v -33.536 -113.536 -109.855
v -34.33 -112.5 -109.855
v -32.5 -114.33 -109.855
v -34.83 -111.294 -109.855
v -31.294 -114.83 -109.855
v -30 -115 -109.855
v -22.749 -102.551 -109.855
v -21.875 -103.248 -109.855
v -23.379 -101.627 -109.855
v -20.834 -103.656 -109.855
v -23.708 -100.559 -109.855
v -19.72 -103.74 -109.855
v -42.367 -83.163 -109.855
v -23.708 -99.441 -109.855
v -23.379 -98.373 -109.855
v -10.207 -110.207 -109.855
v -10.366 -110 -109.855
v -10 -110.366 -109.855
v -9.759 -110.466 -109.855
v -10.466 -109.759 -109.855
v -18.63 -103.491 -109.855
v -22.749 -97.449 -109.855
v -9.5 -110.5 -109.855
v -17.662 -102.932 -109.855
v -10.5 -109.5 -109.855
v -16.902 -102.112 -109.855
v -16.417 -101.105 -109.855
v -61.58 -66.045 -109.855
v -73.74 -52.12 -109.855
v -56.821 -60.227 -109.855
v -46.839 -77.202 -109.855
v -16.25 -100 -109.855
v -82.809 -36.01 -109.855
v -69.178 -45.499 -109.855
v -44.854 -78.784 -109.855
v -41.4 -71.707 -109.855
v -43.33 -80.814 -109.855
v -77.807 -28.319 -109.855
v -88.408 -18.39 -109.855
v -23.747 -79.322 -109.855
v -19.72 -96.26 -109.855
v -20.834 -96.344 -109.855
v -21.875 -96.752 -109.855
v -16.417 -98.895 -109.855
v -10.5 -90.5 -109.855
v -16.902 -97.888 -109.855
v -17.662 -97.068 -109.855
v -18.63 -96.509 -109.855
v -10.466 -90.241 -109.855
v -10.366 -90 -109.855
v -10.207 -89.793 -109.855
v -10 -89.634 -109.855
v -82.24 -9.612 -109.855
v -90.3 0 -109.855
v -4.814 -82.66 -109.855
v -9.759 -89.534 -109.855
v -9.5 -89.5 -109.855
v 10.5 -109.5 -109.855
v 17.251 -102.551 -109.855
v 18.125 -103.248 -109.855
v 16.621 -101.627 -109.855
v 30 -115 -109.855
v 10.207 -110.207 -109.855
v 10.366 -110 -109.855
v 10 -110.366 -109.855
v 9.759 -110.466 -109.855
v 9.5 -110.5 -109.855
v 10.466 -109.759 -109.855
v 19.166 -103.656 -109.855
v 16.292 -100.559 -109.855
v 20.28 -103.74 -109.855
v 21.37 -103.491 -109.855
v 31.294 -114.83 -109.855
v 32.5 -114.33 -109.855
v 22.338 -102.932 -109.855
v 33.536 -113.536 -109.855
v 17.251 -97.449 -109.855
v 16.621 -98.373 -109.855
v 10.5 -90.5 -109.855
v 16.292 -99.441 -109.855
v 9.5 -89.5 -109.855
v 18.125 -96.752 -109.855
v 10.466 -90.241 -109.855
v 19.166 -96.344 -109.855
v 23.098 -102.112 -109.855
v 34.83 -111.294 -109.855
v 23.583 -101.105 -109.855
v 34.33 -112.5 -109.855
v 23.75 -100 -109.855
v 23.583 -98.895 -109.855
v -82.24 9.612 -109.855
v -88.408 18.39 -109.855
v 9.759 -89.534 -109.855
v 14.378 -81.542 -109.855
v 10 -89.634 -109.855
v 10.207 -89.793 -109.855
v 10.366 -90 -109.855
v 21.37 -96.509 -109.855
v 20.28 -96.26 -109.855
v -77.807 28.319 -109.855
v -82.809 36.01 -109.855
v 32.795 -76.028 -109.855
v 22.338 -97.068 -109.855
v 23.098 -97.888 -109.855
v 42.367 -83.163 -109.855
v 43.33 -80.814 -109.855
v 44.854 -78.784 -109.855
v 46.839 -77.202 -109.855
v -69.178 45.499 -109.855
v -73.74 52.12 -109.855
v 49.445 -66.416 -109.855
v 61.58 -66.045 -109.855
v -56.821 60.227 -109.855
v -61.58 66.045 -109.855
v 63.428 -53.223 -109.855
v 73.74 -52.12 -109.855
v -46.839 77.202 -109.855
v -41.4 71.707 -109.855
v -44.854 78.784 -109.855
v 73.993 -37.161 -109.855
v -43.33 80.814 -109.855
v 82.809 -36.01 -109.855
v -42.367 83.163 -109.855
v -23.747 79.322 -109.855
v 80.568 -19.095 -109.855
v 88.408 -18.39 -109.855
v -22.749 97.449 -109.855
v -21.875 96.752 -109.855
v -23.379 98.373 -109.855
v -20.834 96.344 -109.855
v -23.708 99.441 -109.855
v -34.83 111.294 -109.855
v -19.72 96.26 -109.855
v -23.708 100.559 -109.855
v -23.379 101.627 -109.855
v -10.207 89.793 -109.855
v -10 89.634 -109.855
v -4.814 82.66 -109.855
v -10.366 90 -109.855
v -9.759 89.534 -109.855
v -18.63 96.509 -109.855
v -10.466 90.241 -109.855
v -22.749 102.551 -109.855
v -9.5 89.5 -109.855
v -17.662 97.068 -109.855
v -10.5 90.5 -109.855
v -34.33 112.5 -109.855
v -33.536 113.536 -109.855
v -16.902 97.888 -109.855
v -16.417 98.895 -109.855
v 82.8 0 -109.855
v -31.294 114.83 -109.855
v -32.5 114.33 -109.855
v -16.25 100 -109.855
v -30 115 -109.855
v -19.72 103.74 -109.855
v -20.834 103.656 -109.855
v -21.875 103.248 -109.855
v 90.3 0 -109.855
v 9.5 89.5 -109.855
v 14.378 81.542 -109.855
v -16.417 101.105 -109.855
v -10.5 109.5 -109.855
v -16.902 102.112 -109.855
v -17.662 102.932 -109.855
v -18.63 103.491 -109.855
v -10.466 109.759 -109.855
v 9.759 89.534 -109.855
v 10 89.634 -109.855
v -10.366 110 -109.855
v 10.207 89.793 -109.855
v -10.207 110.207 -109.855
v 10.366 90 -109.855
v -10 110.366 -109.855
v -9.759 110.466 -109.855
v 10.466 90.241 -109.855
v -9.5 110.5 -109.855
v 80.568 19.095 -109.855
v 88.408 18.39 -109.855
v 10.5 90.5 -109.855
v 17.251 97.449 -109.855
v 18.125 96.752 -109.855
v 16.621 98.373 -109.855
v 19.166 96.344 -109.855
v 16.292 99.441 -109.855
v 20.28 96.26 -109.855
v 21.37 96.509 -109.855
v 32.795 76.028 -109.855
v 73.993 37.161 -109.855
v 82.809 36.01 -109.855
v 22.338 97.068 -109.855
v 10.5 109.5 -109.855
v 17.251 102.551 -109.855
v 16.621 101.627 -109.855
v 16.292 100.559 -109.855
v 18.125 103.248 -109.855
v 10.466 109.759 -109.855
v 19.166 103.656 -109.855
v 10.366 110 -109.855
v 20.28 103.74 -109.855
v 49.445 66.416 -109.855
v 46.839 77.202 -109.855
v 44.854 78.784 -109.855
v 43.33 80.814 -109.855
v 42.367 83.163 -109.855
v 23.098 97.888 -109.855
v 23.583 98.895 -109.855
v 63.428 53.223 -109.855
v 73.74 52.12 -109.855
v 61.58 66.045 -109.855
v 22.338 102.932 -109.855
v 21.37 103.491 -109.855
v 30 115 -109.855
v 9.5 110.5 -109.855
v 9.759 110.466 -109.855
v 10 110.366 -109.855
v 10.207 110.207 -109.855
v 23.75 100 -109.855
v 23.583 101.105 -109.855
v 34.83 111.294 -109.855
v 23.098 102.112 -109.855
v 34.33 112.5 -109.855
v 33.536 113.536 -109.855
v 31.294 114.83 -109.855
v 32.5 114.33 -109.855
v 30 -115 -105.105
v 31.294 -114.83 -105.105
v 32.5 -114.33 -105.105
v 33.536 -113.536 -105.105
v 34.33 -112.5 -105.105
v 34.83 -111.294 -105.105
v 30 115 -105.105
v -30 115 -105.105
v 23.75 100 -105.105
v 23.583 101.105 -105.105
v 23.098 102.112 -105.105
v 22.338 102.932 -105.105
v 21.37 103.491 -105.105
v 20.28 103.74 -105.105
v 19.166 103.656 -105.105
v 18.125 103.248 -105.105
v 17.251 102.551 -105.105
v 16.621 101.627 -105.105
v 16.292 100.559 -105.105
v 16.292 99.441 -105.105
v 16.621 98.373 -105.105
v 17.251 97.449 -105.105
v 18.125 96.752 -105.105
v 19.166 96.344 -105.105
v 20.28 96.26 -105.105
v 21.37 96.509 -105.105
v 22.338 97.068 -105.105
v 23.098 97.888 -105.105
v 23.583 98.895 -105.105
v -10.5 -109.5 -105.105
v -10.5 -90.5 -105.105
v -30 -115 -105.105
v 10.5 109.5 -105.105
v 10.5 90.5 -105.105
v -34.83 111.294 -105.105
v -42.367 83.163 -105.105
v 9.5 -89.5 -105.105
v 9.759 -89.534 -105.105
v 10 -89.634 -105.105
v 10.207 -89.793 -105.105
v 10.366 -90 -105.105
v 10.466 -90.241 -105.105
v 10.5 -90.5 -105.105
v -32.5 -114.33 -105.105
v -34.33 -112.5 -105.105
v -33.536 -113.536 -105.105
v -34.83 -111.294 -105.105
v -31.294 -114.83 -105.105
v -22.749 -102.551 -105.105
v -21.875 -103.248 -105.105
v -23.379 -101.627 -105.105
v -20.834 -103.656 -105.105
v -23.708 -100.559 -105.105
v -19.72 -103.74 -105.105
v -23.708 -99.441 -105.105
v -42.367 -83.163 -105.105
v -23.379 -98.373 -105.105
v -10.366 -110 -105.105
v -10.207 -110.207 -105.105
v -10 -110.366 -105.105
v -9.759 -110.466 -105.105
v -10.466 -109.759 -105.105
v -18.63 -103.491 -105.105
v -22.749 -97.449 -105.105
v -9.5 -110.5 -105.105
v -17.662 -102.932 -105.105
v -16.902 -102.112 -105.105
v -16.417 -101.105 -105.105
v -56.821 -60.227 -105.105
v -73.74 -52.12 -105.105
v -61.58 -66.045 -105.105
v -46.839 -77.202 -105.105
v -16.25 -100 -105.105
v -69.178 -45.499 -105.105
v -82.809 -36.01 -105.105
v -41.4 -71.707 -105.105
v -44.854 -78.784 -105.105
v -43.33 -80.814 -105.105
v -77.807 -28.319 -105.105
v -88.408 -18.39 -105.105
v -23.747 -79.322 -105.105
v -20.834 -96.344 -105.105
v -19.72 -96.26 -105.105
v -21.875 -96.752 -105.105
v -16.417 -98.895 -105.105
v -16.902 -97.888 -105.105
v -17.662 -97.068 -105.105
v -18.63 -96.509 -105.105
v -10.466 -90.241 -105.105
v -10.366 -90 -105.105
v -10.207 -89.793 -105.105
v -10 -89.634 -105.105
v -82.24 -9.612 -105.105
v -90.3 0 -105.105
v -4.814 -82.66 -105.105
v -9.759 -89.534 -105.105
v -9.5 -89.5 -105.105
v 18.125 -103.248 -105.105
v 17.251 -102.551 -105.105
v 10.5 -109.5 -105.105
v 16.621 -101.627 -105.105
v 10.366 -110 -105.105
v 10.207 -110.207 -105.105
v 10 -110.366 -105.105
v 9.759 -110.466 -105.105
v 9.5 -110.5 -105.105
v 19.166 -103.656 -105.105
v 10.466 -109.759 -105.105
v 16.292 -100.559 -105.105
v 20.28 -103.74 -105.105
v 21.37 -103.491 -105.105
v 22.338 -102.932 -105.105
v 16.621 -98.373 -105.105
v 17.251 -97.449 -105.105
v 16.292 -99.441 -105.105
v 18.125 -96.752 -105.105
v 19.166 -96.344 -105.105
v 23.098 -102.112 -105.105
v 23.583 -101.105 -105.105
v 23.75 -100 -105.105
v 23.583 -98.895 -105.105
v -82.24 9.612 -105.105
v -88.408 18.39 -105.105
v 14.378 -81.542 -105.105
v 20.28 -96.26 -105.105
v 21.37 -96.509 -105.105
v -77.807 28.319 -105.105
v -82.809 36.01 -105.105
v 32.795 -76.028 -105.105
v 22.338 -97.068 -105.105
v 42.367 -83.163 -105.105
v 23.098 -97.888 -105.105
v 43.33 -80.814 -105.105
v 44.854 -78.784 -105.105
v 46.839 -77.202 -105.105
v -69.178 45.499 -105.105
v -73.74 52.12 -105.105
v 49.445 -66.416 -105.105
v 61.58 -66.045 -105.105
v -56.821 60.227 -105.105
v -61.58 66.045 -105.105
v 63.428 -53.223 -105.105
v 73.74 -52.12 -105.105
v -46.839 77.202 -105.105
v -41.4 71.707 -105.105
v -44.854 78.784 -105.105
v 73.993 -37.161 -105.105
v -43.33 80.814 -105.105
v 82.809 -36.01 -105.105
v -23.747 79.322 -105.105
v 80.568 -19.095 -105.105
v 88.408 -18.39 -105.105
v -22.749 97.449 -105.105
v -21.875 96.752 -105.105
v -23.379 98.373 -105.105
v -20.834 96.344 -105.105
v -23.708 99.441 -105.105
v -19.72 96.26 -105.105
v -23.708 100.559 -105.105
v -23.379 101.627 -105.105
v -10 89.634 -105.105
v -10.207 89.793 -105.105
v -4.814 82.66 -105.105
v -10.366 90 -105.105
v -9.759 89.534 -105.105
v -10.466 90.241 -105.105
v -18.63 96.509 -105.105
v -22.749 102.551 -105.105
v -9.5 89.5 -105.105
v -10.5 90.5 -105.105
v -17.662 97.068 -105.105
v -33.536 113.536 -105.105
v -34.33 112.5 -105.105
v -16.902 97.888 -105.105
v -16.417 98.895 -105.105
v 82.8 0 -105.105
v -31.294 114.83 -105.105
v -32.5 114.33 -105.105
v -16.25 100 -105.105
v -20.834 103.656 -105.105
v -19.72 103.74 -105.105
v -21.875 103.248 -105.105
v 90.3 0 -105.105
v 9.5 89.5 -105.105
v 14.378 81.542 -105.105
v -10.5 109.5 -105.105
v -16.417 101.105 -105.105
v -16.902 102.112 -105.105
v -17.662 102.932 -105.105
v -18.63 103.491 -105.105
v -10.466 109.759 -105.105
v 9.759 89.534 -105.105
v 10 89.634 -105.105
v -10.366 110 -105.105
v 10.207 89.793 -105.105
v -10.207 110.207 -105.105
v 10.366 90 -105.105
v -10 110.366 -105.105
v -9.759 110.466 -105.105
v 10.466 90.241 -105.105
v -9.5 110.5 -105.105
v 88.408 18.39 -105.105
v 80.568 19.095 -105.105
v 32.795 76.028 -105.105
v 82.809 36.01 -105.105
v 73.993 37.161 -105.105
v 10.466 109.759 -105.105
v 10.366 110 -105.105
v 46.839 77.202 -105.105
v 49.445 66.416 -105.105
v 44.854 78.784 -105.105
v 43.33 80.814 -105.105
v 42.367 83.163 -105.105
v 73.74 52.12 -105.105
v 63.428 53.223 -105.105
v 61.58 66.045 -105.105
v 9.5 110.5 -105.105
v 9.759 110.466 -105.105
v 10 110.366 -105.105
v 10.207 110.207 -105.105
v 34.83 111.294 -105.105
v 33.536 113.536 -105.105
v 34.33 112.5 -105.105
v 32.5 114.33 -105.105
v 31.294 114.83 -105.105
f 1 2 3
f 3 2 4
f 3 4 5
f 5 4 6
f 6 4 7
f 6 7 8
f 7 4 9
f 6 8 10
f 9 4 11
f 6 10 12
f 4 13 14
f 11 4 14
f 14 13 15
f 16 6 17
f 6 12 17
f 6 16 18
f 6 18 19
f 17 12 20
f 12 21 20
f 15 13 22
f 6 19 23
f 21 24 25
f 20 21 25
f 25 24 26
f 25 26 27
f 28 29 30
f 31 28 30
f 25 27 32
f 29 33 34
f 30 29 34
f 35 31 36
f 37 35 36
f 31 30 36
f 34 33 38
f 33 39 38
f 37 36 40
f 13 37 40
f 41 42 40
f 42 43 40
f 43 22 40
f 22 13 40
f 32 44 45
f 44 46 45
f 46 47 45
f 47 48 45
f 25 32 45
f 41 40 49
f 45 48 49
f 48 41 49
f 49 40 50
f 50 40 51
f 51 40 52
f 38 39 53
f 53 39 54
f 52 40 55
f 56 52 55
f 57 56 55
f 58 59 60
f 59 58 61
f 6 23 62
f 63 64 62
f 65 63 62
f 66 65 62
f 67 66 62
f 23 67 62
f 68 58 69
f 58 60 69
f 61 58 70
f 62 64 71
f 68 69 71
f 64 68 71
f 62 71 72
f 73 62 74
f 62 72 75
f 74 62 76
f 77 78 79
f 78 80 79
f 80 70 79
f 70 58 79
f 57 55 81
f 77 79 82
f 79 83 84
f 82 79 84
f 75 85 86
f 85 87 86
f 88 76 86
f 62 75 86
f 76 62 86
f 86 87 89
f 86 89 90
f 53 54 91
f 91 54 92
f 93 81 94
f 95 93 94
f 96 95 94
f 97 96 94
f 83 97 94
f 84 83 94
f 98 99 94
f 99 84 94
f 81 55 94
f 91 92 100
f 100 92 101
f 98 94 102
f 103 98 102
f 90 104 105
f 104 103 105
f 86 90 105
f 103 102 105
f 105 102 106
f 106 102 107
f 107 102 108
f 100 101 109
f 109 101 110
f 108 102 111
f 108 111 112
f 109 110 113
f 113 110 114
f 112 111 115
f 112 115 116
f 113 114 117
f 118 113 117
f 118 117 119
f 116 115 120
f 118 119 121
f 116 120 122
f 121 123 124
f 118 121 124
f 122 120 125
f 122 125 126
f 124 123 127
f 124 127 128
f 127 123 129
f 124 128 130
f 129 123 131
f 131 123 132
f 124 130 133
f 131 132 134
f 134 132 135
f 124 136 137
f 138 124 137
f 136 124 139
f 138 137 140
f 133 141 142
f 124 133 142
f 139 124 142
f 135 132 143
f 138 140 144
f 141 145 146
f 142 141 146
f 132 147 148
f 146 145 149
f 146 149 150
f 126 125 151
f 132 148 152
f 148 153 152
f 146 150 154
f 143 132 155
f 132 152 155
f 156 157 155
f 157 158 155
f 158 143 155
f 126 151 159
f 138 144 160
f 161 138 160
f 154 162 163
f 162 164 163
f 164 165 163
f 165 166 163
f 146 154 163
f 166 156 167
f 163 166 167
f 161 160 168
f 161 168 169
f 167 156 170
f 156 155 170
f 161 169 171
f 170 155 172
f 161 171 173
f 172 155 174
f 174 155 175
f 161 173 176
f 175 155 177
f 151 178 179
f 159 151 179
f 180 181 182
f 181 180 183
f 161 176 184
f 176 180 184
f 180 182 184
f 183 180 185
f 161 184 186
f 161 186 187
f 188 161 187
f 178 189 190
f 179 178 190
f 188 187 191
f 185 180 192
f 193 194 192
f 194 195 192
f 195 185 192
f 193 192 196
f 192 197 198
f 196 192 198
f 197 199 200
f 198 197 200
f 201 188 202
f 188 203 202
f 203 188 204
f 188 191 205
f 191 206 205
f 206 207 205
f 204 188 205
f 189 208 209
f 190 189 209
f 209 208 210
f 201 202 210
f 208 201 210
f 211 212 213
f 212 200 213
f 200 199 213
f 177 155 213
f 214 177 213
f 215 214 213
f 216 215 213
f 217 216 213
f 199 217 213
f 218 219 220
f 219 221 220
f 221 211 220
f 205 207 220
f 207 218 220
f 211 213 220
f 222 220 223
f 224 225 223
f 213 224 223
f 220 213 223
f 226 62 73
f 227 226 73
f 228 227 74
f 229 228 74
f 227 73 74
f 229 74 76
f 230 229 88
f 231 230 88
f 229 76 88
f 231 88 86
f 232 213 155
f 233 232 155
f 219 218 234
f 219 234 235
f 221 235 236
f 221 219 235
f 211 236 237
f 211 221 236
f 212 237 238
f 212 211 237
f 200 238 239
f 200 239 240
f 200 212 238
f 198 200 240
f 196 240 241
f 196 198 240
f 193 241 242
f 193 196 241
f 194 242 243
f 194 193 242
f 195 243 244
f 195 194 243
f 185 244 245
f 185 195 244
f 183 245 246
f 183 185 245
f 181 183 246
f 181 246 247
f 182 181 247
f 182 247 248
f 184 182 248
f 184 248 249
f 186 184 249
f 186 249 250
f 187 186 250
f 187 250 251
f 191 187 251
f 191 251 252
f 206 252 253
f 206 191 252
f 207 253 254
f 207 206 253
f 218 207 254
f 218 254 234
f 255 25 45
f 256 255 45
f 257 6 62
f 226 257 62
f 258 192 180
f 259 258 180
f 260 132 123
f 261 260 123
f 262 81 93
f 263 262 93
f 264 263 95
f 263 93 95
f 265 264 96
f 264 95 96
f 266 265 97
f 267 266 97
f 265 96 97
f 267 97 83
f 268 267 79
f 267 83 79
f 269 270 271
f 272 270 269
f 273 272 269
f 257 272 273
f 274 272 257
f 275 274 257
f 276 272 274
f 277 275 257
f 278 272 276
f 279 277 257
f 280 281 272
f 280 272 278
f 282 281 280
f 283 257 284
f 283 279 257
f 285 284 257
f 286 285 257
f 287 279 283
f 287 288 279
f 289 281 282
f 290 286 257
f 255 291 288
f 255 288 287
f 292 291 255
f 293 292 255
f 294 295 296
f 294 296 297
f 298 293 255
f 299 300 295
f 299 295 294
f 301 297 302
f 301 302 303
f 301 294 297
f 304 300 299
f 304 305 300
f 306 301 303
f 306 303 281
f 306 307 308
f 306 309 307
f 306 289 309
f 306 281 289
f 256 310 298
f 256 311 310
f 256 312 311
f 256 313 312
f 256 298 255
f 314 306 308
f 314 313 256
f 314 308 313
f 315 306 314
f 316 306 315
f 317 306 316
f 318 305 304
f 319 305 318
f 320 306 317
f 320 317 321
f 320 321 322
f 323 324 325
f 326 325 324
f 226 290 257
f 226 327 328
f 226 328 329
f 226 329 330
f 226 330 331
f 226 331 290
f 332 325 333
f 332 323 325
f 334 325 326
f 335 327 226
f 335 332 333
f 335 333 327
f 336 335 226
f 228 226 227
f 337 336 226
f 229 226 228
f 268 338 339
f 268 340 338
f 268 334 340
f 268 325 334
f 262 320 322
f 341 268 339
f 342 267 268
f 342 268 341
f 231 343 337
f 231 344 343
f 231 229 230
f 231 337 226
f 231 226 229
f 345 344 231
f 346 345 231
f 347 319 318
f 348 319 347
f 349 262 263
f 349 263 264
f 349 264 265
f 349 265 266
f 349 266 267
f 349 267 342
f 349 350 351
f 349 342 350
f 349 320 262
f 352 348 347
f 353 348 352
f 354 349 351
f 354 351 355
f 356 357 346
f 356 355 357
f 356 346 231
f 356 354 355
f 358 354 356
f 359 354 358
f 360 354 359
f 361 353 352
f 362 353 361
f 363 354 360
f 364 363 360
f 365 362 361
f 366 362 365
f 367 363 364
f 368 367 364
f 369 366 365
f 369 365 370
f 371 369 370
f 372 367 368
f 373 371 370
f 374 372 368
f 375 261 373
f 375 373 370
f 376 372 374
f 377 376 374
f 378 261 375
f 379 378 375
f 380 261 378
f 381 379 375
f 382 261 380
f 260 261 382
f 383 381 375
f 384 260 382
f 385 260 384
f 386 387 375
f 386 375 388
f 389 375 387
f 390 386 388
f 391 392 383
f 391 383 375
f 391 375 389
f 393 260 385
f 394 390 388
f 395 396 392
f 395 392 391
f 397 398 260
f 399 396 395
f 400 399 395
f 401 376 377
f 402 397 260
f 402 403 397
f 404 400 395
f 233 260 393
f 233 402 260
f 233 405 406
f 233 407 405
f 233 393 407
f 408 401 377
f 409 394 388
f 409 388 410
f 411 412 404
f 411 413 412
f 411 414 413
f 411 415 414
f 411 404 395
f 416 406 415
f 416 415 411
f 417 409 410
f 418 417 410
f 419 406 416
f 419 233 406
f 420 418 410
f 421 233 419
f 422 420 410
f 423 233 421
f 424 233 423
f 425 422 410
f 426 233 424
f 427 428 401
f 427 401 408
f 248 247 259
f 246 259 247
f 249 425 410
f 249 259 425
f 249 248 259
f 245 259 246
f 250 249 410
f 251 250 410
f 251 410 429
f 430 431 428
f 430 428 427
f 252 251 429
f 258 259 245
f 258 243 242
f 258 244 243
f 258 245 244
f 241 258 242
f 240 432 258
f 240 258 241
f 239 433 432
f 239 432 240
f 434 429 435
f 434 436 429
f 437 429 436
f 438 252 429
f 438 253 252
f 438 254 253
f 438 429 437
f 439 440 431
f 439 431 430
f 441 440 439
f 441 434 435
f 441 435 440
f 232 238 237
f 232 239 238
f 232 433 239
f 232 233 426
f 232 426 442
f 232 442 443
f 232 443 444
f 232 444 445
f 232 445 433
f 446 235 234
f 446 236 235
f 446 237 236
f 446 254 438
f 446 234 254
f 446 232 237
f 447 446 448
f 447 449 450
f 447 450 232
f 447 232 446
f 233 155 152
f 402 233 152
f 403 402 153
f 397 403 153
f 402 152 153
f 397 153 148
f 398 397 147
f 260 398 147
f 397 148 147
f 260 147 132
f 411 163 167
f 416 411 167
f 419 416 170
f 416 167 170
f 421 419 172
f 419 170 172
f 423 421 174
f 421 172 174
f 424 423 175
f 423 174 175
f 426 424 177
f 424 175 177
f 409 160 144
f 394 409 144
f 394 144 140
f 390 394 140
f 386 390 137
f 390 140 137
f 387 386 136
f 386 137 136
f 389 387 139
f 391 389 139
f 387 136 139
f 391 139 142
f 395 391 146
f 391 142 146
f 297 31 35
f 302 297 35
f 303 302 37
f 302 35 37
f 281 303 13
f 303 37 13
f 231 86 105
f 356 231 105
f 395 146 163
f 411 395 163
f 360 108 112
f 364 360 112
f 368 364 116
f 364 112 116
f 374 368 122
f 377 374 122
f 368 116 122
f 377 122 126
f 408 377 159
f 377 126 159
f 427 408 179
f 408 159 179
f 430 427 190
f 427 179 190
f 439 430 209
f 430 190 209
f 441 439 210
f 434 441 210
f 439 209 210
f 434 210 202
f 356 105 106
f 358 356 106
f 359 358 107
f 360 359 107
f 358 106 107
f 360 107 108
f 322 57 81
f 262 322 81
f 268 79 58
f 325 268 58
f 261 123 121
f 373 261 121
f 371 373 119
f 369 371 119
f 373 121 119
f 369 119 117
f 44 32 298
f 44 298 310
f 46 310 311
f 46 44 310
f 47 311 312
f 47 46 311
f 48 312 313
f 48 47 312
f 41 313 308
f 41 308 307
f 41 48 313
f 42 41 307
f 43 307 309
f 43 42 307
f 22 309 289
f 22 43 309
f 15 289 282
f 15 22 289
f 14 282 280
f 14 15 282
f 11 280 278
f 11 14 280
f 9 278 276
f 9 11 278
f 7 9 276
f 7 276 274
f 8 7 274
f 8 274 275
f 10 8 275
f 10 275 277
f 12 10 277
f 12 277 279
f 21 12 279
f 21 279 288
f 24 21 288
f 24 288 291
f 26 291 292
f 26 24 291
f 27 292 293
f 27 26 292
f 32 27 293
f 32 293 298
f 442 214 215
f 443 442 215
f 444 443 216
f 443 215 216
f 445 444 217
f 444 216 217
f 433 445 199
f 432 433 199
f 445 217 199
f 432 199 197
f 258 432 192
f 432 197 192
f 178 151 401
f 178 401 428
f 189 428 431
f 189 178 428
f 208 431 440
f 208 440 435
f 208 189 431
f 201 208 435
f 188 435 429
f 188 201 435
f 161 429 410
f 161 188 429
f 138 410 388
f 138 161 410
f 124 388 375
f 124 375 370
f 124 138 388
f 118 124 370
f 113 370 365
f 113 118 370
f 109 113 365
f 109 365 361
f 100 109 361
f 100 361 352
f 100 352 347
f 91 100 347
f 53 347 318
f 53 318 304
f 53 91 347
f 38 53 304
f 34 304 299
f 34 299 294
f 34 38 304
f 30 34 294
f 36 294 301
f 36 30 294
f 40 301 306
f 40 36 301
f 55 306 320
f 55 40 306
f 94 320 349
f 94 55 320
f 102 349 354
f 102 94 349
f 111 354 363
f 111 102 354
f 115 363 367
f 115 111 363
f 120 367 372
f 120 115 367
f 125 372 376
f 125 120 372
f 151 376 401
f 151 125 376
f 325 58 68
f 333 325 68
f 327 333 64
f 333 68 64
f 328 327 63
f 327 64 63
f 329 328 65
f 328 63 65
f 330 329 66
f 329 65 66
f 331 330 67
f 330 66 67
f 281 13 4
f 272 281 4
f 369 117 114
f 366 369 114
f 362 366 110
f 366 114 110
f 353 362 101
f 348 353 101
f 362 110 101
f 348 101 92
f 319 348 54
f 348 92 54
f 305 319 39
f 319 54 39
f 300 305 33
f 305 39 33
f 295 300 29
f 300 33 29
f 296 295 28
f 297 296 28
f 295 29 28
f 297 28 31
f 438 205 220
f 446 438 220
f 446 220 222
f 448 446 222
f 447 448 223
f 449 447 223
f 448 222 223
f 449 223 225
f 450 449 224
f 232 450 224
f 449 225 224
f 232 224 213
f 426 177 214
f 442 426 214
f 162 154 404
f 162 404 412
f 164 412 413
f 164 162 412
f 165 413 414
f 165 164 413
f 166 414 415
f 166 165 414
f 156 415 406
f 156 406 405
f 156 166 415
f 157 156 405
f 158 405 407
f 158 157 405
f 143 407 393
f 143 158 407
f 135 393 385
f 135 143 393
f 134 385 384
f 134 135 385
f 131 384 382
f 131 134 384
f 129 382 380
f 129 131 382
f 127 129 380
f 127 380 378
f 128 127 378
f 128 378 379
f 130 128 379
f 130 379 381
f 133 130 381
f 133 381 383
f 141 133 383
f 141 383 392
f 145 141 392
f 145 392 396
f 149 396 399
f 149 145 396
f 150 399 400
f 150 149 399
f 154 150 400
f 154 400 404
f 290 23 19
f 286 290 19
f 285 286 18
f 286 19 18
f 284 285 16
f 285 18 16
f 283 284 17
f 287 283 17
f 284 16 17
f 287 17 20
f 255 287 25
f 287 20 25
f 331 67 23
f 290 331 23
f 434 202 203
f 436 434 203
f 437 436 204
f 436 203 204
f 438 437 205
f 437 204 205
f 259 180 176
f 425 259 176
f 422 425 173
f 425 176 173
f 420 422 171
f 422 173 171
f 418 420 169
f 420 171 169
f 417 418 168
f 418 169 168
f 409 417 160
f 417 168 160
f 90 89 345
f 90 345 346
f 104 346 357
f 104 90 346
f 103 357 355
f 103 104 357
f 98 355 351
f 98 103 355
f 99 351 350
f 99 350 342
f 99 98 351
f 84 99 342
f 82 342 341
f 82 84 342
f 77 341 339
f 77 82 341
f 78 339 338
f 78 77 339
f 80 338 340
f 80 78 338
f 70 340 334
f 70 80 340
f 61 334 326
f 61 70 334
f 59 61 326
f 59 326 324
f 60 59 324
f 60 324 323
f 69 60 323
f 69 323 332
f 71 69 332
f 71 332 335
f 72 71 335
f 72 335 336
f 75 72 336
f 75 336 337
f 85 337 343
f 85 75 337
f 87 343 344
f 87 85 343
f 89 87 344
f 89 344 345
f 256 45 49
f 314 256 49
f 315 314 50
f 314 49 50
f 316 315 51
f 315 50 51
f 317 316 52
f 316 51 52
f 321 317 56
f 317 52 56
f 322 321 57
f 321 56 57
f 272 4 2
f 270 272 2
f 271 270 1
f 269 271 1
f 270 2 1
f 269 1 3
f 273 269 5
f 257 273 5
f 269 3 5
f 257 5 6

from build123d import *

# Parameters (mm, degrees)
SKETCH2_R           = 3.75
SKETCH2_R_2         = 82.8
BOSS_EXTRUDE1_DEPTH = 4.7498


with BuildPart() as part:
    # Sketch2 → Boss-Extrude1 (new body)
    with BuildSketch(Plane.XY.offset(-109.855)):
        with BuildLine():
            Line((34.829629131, -111.294095226), (42.367226853, -83.16339756))
            ThreePointArc((42.367226853, -83.16339756), (44.027245948, -79.750573703), (46.839397866, -77.202077741))
            ThreePointArc((46.839397866, -77.202077741), (90.3, 0), (46.839397866, 77.202077741))
            ThreePointArc((46.839397866, 77.202077741), (44.027245948, 79.750573703), (42.367226853, 83.16339756))
            Line((42.367226853, 83.16339756), (34.829629131, 111.294095226))
            ThreePointArc((34.829629131, 111.294095226), (33.043807145, 113.966766701), (30, 115))
            Line((30, 115), (-30, 115))
            ThreePointArc((-30, 115), (-33.043807145, 113.966766701), (-34.829629131, 111.294095226))
            Line((-34.829629131, 111.294095226), (-42.367226853, 83.16339756))
            ThreePointArc((-42.367226853, 83.16339756), (-44.027245948, 79.750573703), (-46.839397866, 77.202077741))
            ThreePointArc((-46.839397866, 77.202077741), (-90.3, 0), (-46.839397866, -77.202077741))
            ThreePointArc((-46.839397866, -77.202077741), (-44.027245948, -79.750573703), (-42.367226853, -83.16339756))
            Line((-42.367226853, -83.16339756), (-34.829629131, -111.294095226))
            ThreePointArc((-34.829629131, -111.294095226), (-33.043807145, -113.966766701), (-30, -115))
            Line((-30, -115), (30, -115))
            ThreePointArc((30, -115), (33.043807145, -113.966766701), (34.829629131, -111.294095226))
        make_face()
        with Locations((20, -100)):
            Circle(SKETCH2_R, mode=Mode.SUBTRACT)
        with Locations((-20, -100)):
            Circle(SKETCH2_R, mode=Mode.SUBTRACT)
        with Locations((-20, 100)):
            Circle(SKETCH2_R, mode=Mode.SUBTRACT)
        with Locations((20, 100)):
            Circle(SKETCH2_R, mode=Mode.SUBTRACT)
        Circle(SKETCH2_R_2, mode=Mode.SUBTRACT)
        with BuildLine():
            Line((9.5, 89.5), (-9.5, 89.5))
            ThreePointArc((-9.5, 89.5), (-10.207106781, 89.792893219), (-10.5, 90.5))
            Line((-10.5, 90.5), (-10.5, 109.5))
            ThreePointArc((-10.5, 109.5), (-10.207106781, 110.207106781), (-9.5, 110.5))
            Line((-9.5, 110.5), (9.5, 110.5))
            ThreePointArc((9.5, 110.5), (10.207106781, 110.207106781), (10.5, 109.5))
            Line((10.5, 109.5), (10.5, 90.5))
            ThreePointArc((10.5, 90.5), (10.207106781, 89.792893219), (9.5, 89.5))
        make_face(mode=Mode.SUBTRACT)
        with BuildLine():
            Line((9.5, -110.5), (-9.5, -110.5))
            ThreePointArc((-9.5, -110.5), (-10.207106781, -110.207106781), (-10.5, -109.5))
            Line((-10.5, -109.5), (-10.5, -90.5))
            ThreePointArc((-10.5, -90.5), (-10.207106781, -89.792893219), (-9.5, -89.5))
            Line((-9.5, -89.5), (9.5, -89.5))
            ThreePointArc((9.5, -89.5), (10.207106781, -89.792893219), (10.5, -90.5))
            Line((10.5, -90.5), (10.5, -109.5))
            ThreePointArc((10.5, -109.5), (10.207106781, -110.207106781), (9.5, -110.5))
        make_face(mode=Mode.SUBTRACT)
    extrude(amount=BOSS_EXTRUDE1_DEPTH)


solid = part.part
